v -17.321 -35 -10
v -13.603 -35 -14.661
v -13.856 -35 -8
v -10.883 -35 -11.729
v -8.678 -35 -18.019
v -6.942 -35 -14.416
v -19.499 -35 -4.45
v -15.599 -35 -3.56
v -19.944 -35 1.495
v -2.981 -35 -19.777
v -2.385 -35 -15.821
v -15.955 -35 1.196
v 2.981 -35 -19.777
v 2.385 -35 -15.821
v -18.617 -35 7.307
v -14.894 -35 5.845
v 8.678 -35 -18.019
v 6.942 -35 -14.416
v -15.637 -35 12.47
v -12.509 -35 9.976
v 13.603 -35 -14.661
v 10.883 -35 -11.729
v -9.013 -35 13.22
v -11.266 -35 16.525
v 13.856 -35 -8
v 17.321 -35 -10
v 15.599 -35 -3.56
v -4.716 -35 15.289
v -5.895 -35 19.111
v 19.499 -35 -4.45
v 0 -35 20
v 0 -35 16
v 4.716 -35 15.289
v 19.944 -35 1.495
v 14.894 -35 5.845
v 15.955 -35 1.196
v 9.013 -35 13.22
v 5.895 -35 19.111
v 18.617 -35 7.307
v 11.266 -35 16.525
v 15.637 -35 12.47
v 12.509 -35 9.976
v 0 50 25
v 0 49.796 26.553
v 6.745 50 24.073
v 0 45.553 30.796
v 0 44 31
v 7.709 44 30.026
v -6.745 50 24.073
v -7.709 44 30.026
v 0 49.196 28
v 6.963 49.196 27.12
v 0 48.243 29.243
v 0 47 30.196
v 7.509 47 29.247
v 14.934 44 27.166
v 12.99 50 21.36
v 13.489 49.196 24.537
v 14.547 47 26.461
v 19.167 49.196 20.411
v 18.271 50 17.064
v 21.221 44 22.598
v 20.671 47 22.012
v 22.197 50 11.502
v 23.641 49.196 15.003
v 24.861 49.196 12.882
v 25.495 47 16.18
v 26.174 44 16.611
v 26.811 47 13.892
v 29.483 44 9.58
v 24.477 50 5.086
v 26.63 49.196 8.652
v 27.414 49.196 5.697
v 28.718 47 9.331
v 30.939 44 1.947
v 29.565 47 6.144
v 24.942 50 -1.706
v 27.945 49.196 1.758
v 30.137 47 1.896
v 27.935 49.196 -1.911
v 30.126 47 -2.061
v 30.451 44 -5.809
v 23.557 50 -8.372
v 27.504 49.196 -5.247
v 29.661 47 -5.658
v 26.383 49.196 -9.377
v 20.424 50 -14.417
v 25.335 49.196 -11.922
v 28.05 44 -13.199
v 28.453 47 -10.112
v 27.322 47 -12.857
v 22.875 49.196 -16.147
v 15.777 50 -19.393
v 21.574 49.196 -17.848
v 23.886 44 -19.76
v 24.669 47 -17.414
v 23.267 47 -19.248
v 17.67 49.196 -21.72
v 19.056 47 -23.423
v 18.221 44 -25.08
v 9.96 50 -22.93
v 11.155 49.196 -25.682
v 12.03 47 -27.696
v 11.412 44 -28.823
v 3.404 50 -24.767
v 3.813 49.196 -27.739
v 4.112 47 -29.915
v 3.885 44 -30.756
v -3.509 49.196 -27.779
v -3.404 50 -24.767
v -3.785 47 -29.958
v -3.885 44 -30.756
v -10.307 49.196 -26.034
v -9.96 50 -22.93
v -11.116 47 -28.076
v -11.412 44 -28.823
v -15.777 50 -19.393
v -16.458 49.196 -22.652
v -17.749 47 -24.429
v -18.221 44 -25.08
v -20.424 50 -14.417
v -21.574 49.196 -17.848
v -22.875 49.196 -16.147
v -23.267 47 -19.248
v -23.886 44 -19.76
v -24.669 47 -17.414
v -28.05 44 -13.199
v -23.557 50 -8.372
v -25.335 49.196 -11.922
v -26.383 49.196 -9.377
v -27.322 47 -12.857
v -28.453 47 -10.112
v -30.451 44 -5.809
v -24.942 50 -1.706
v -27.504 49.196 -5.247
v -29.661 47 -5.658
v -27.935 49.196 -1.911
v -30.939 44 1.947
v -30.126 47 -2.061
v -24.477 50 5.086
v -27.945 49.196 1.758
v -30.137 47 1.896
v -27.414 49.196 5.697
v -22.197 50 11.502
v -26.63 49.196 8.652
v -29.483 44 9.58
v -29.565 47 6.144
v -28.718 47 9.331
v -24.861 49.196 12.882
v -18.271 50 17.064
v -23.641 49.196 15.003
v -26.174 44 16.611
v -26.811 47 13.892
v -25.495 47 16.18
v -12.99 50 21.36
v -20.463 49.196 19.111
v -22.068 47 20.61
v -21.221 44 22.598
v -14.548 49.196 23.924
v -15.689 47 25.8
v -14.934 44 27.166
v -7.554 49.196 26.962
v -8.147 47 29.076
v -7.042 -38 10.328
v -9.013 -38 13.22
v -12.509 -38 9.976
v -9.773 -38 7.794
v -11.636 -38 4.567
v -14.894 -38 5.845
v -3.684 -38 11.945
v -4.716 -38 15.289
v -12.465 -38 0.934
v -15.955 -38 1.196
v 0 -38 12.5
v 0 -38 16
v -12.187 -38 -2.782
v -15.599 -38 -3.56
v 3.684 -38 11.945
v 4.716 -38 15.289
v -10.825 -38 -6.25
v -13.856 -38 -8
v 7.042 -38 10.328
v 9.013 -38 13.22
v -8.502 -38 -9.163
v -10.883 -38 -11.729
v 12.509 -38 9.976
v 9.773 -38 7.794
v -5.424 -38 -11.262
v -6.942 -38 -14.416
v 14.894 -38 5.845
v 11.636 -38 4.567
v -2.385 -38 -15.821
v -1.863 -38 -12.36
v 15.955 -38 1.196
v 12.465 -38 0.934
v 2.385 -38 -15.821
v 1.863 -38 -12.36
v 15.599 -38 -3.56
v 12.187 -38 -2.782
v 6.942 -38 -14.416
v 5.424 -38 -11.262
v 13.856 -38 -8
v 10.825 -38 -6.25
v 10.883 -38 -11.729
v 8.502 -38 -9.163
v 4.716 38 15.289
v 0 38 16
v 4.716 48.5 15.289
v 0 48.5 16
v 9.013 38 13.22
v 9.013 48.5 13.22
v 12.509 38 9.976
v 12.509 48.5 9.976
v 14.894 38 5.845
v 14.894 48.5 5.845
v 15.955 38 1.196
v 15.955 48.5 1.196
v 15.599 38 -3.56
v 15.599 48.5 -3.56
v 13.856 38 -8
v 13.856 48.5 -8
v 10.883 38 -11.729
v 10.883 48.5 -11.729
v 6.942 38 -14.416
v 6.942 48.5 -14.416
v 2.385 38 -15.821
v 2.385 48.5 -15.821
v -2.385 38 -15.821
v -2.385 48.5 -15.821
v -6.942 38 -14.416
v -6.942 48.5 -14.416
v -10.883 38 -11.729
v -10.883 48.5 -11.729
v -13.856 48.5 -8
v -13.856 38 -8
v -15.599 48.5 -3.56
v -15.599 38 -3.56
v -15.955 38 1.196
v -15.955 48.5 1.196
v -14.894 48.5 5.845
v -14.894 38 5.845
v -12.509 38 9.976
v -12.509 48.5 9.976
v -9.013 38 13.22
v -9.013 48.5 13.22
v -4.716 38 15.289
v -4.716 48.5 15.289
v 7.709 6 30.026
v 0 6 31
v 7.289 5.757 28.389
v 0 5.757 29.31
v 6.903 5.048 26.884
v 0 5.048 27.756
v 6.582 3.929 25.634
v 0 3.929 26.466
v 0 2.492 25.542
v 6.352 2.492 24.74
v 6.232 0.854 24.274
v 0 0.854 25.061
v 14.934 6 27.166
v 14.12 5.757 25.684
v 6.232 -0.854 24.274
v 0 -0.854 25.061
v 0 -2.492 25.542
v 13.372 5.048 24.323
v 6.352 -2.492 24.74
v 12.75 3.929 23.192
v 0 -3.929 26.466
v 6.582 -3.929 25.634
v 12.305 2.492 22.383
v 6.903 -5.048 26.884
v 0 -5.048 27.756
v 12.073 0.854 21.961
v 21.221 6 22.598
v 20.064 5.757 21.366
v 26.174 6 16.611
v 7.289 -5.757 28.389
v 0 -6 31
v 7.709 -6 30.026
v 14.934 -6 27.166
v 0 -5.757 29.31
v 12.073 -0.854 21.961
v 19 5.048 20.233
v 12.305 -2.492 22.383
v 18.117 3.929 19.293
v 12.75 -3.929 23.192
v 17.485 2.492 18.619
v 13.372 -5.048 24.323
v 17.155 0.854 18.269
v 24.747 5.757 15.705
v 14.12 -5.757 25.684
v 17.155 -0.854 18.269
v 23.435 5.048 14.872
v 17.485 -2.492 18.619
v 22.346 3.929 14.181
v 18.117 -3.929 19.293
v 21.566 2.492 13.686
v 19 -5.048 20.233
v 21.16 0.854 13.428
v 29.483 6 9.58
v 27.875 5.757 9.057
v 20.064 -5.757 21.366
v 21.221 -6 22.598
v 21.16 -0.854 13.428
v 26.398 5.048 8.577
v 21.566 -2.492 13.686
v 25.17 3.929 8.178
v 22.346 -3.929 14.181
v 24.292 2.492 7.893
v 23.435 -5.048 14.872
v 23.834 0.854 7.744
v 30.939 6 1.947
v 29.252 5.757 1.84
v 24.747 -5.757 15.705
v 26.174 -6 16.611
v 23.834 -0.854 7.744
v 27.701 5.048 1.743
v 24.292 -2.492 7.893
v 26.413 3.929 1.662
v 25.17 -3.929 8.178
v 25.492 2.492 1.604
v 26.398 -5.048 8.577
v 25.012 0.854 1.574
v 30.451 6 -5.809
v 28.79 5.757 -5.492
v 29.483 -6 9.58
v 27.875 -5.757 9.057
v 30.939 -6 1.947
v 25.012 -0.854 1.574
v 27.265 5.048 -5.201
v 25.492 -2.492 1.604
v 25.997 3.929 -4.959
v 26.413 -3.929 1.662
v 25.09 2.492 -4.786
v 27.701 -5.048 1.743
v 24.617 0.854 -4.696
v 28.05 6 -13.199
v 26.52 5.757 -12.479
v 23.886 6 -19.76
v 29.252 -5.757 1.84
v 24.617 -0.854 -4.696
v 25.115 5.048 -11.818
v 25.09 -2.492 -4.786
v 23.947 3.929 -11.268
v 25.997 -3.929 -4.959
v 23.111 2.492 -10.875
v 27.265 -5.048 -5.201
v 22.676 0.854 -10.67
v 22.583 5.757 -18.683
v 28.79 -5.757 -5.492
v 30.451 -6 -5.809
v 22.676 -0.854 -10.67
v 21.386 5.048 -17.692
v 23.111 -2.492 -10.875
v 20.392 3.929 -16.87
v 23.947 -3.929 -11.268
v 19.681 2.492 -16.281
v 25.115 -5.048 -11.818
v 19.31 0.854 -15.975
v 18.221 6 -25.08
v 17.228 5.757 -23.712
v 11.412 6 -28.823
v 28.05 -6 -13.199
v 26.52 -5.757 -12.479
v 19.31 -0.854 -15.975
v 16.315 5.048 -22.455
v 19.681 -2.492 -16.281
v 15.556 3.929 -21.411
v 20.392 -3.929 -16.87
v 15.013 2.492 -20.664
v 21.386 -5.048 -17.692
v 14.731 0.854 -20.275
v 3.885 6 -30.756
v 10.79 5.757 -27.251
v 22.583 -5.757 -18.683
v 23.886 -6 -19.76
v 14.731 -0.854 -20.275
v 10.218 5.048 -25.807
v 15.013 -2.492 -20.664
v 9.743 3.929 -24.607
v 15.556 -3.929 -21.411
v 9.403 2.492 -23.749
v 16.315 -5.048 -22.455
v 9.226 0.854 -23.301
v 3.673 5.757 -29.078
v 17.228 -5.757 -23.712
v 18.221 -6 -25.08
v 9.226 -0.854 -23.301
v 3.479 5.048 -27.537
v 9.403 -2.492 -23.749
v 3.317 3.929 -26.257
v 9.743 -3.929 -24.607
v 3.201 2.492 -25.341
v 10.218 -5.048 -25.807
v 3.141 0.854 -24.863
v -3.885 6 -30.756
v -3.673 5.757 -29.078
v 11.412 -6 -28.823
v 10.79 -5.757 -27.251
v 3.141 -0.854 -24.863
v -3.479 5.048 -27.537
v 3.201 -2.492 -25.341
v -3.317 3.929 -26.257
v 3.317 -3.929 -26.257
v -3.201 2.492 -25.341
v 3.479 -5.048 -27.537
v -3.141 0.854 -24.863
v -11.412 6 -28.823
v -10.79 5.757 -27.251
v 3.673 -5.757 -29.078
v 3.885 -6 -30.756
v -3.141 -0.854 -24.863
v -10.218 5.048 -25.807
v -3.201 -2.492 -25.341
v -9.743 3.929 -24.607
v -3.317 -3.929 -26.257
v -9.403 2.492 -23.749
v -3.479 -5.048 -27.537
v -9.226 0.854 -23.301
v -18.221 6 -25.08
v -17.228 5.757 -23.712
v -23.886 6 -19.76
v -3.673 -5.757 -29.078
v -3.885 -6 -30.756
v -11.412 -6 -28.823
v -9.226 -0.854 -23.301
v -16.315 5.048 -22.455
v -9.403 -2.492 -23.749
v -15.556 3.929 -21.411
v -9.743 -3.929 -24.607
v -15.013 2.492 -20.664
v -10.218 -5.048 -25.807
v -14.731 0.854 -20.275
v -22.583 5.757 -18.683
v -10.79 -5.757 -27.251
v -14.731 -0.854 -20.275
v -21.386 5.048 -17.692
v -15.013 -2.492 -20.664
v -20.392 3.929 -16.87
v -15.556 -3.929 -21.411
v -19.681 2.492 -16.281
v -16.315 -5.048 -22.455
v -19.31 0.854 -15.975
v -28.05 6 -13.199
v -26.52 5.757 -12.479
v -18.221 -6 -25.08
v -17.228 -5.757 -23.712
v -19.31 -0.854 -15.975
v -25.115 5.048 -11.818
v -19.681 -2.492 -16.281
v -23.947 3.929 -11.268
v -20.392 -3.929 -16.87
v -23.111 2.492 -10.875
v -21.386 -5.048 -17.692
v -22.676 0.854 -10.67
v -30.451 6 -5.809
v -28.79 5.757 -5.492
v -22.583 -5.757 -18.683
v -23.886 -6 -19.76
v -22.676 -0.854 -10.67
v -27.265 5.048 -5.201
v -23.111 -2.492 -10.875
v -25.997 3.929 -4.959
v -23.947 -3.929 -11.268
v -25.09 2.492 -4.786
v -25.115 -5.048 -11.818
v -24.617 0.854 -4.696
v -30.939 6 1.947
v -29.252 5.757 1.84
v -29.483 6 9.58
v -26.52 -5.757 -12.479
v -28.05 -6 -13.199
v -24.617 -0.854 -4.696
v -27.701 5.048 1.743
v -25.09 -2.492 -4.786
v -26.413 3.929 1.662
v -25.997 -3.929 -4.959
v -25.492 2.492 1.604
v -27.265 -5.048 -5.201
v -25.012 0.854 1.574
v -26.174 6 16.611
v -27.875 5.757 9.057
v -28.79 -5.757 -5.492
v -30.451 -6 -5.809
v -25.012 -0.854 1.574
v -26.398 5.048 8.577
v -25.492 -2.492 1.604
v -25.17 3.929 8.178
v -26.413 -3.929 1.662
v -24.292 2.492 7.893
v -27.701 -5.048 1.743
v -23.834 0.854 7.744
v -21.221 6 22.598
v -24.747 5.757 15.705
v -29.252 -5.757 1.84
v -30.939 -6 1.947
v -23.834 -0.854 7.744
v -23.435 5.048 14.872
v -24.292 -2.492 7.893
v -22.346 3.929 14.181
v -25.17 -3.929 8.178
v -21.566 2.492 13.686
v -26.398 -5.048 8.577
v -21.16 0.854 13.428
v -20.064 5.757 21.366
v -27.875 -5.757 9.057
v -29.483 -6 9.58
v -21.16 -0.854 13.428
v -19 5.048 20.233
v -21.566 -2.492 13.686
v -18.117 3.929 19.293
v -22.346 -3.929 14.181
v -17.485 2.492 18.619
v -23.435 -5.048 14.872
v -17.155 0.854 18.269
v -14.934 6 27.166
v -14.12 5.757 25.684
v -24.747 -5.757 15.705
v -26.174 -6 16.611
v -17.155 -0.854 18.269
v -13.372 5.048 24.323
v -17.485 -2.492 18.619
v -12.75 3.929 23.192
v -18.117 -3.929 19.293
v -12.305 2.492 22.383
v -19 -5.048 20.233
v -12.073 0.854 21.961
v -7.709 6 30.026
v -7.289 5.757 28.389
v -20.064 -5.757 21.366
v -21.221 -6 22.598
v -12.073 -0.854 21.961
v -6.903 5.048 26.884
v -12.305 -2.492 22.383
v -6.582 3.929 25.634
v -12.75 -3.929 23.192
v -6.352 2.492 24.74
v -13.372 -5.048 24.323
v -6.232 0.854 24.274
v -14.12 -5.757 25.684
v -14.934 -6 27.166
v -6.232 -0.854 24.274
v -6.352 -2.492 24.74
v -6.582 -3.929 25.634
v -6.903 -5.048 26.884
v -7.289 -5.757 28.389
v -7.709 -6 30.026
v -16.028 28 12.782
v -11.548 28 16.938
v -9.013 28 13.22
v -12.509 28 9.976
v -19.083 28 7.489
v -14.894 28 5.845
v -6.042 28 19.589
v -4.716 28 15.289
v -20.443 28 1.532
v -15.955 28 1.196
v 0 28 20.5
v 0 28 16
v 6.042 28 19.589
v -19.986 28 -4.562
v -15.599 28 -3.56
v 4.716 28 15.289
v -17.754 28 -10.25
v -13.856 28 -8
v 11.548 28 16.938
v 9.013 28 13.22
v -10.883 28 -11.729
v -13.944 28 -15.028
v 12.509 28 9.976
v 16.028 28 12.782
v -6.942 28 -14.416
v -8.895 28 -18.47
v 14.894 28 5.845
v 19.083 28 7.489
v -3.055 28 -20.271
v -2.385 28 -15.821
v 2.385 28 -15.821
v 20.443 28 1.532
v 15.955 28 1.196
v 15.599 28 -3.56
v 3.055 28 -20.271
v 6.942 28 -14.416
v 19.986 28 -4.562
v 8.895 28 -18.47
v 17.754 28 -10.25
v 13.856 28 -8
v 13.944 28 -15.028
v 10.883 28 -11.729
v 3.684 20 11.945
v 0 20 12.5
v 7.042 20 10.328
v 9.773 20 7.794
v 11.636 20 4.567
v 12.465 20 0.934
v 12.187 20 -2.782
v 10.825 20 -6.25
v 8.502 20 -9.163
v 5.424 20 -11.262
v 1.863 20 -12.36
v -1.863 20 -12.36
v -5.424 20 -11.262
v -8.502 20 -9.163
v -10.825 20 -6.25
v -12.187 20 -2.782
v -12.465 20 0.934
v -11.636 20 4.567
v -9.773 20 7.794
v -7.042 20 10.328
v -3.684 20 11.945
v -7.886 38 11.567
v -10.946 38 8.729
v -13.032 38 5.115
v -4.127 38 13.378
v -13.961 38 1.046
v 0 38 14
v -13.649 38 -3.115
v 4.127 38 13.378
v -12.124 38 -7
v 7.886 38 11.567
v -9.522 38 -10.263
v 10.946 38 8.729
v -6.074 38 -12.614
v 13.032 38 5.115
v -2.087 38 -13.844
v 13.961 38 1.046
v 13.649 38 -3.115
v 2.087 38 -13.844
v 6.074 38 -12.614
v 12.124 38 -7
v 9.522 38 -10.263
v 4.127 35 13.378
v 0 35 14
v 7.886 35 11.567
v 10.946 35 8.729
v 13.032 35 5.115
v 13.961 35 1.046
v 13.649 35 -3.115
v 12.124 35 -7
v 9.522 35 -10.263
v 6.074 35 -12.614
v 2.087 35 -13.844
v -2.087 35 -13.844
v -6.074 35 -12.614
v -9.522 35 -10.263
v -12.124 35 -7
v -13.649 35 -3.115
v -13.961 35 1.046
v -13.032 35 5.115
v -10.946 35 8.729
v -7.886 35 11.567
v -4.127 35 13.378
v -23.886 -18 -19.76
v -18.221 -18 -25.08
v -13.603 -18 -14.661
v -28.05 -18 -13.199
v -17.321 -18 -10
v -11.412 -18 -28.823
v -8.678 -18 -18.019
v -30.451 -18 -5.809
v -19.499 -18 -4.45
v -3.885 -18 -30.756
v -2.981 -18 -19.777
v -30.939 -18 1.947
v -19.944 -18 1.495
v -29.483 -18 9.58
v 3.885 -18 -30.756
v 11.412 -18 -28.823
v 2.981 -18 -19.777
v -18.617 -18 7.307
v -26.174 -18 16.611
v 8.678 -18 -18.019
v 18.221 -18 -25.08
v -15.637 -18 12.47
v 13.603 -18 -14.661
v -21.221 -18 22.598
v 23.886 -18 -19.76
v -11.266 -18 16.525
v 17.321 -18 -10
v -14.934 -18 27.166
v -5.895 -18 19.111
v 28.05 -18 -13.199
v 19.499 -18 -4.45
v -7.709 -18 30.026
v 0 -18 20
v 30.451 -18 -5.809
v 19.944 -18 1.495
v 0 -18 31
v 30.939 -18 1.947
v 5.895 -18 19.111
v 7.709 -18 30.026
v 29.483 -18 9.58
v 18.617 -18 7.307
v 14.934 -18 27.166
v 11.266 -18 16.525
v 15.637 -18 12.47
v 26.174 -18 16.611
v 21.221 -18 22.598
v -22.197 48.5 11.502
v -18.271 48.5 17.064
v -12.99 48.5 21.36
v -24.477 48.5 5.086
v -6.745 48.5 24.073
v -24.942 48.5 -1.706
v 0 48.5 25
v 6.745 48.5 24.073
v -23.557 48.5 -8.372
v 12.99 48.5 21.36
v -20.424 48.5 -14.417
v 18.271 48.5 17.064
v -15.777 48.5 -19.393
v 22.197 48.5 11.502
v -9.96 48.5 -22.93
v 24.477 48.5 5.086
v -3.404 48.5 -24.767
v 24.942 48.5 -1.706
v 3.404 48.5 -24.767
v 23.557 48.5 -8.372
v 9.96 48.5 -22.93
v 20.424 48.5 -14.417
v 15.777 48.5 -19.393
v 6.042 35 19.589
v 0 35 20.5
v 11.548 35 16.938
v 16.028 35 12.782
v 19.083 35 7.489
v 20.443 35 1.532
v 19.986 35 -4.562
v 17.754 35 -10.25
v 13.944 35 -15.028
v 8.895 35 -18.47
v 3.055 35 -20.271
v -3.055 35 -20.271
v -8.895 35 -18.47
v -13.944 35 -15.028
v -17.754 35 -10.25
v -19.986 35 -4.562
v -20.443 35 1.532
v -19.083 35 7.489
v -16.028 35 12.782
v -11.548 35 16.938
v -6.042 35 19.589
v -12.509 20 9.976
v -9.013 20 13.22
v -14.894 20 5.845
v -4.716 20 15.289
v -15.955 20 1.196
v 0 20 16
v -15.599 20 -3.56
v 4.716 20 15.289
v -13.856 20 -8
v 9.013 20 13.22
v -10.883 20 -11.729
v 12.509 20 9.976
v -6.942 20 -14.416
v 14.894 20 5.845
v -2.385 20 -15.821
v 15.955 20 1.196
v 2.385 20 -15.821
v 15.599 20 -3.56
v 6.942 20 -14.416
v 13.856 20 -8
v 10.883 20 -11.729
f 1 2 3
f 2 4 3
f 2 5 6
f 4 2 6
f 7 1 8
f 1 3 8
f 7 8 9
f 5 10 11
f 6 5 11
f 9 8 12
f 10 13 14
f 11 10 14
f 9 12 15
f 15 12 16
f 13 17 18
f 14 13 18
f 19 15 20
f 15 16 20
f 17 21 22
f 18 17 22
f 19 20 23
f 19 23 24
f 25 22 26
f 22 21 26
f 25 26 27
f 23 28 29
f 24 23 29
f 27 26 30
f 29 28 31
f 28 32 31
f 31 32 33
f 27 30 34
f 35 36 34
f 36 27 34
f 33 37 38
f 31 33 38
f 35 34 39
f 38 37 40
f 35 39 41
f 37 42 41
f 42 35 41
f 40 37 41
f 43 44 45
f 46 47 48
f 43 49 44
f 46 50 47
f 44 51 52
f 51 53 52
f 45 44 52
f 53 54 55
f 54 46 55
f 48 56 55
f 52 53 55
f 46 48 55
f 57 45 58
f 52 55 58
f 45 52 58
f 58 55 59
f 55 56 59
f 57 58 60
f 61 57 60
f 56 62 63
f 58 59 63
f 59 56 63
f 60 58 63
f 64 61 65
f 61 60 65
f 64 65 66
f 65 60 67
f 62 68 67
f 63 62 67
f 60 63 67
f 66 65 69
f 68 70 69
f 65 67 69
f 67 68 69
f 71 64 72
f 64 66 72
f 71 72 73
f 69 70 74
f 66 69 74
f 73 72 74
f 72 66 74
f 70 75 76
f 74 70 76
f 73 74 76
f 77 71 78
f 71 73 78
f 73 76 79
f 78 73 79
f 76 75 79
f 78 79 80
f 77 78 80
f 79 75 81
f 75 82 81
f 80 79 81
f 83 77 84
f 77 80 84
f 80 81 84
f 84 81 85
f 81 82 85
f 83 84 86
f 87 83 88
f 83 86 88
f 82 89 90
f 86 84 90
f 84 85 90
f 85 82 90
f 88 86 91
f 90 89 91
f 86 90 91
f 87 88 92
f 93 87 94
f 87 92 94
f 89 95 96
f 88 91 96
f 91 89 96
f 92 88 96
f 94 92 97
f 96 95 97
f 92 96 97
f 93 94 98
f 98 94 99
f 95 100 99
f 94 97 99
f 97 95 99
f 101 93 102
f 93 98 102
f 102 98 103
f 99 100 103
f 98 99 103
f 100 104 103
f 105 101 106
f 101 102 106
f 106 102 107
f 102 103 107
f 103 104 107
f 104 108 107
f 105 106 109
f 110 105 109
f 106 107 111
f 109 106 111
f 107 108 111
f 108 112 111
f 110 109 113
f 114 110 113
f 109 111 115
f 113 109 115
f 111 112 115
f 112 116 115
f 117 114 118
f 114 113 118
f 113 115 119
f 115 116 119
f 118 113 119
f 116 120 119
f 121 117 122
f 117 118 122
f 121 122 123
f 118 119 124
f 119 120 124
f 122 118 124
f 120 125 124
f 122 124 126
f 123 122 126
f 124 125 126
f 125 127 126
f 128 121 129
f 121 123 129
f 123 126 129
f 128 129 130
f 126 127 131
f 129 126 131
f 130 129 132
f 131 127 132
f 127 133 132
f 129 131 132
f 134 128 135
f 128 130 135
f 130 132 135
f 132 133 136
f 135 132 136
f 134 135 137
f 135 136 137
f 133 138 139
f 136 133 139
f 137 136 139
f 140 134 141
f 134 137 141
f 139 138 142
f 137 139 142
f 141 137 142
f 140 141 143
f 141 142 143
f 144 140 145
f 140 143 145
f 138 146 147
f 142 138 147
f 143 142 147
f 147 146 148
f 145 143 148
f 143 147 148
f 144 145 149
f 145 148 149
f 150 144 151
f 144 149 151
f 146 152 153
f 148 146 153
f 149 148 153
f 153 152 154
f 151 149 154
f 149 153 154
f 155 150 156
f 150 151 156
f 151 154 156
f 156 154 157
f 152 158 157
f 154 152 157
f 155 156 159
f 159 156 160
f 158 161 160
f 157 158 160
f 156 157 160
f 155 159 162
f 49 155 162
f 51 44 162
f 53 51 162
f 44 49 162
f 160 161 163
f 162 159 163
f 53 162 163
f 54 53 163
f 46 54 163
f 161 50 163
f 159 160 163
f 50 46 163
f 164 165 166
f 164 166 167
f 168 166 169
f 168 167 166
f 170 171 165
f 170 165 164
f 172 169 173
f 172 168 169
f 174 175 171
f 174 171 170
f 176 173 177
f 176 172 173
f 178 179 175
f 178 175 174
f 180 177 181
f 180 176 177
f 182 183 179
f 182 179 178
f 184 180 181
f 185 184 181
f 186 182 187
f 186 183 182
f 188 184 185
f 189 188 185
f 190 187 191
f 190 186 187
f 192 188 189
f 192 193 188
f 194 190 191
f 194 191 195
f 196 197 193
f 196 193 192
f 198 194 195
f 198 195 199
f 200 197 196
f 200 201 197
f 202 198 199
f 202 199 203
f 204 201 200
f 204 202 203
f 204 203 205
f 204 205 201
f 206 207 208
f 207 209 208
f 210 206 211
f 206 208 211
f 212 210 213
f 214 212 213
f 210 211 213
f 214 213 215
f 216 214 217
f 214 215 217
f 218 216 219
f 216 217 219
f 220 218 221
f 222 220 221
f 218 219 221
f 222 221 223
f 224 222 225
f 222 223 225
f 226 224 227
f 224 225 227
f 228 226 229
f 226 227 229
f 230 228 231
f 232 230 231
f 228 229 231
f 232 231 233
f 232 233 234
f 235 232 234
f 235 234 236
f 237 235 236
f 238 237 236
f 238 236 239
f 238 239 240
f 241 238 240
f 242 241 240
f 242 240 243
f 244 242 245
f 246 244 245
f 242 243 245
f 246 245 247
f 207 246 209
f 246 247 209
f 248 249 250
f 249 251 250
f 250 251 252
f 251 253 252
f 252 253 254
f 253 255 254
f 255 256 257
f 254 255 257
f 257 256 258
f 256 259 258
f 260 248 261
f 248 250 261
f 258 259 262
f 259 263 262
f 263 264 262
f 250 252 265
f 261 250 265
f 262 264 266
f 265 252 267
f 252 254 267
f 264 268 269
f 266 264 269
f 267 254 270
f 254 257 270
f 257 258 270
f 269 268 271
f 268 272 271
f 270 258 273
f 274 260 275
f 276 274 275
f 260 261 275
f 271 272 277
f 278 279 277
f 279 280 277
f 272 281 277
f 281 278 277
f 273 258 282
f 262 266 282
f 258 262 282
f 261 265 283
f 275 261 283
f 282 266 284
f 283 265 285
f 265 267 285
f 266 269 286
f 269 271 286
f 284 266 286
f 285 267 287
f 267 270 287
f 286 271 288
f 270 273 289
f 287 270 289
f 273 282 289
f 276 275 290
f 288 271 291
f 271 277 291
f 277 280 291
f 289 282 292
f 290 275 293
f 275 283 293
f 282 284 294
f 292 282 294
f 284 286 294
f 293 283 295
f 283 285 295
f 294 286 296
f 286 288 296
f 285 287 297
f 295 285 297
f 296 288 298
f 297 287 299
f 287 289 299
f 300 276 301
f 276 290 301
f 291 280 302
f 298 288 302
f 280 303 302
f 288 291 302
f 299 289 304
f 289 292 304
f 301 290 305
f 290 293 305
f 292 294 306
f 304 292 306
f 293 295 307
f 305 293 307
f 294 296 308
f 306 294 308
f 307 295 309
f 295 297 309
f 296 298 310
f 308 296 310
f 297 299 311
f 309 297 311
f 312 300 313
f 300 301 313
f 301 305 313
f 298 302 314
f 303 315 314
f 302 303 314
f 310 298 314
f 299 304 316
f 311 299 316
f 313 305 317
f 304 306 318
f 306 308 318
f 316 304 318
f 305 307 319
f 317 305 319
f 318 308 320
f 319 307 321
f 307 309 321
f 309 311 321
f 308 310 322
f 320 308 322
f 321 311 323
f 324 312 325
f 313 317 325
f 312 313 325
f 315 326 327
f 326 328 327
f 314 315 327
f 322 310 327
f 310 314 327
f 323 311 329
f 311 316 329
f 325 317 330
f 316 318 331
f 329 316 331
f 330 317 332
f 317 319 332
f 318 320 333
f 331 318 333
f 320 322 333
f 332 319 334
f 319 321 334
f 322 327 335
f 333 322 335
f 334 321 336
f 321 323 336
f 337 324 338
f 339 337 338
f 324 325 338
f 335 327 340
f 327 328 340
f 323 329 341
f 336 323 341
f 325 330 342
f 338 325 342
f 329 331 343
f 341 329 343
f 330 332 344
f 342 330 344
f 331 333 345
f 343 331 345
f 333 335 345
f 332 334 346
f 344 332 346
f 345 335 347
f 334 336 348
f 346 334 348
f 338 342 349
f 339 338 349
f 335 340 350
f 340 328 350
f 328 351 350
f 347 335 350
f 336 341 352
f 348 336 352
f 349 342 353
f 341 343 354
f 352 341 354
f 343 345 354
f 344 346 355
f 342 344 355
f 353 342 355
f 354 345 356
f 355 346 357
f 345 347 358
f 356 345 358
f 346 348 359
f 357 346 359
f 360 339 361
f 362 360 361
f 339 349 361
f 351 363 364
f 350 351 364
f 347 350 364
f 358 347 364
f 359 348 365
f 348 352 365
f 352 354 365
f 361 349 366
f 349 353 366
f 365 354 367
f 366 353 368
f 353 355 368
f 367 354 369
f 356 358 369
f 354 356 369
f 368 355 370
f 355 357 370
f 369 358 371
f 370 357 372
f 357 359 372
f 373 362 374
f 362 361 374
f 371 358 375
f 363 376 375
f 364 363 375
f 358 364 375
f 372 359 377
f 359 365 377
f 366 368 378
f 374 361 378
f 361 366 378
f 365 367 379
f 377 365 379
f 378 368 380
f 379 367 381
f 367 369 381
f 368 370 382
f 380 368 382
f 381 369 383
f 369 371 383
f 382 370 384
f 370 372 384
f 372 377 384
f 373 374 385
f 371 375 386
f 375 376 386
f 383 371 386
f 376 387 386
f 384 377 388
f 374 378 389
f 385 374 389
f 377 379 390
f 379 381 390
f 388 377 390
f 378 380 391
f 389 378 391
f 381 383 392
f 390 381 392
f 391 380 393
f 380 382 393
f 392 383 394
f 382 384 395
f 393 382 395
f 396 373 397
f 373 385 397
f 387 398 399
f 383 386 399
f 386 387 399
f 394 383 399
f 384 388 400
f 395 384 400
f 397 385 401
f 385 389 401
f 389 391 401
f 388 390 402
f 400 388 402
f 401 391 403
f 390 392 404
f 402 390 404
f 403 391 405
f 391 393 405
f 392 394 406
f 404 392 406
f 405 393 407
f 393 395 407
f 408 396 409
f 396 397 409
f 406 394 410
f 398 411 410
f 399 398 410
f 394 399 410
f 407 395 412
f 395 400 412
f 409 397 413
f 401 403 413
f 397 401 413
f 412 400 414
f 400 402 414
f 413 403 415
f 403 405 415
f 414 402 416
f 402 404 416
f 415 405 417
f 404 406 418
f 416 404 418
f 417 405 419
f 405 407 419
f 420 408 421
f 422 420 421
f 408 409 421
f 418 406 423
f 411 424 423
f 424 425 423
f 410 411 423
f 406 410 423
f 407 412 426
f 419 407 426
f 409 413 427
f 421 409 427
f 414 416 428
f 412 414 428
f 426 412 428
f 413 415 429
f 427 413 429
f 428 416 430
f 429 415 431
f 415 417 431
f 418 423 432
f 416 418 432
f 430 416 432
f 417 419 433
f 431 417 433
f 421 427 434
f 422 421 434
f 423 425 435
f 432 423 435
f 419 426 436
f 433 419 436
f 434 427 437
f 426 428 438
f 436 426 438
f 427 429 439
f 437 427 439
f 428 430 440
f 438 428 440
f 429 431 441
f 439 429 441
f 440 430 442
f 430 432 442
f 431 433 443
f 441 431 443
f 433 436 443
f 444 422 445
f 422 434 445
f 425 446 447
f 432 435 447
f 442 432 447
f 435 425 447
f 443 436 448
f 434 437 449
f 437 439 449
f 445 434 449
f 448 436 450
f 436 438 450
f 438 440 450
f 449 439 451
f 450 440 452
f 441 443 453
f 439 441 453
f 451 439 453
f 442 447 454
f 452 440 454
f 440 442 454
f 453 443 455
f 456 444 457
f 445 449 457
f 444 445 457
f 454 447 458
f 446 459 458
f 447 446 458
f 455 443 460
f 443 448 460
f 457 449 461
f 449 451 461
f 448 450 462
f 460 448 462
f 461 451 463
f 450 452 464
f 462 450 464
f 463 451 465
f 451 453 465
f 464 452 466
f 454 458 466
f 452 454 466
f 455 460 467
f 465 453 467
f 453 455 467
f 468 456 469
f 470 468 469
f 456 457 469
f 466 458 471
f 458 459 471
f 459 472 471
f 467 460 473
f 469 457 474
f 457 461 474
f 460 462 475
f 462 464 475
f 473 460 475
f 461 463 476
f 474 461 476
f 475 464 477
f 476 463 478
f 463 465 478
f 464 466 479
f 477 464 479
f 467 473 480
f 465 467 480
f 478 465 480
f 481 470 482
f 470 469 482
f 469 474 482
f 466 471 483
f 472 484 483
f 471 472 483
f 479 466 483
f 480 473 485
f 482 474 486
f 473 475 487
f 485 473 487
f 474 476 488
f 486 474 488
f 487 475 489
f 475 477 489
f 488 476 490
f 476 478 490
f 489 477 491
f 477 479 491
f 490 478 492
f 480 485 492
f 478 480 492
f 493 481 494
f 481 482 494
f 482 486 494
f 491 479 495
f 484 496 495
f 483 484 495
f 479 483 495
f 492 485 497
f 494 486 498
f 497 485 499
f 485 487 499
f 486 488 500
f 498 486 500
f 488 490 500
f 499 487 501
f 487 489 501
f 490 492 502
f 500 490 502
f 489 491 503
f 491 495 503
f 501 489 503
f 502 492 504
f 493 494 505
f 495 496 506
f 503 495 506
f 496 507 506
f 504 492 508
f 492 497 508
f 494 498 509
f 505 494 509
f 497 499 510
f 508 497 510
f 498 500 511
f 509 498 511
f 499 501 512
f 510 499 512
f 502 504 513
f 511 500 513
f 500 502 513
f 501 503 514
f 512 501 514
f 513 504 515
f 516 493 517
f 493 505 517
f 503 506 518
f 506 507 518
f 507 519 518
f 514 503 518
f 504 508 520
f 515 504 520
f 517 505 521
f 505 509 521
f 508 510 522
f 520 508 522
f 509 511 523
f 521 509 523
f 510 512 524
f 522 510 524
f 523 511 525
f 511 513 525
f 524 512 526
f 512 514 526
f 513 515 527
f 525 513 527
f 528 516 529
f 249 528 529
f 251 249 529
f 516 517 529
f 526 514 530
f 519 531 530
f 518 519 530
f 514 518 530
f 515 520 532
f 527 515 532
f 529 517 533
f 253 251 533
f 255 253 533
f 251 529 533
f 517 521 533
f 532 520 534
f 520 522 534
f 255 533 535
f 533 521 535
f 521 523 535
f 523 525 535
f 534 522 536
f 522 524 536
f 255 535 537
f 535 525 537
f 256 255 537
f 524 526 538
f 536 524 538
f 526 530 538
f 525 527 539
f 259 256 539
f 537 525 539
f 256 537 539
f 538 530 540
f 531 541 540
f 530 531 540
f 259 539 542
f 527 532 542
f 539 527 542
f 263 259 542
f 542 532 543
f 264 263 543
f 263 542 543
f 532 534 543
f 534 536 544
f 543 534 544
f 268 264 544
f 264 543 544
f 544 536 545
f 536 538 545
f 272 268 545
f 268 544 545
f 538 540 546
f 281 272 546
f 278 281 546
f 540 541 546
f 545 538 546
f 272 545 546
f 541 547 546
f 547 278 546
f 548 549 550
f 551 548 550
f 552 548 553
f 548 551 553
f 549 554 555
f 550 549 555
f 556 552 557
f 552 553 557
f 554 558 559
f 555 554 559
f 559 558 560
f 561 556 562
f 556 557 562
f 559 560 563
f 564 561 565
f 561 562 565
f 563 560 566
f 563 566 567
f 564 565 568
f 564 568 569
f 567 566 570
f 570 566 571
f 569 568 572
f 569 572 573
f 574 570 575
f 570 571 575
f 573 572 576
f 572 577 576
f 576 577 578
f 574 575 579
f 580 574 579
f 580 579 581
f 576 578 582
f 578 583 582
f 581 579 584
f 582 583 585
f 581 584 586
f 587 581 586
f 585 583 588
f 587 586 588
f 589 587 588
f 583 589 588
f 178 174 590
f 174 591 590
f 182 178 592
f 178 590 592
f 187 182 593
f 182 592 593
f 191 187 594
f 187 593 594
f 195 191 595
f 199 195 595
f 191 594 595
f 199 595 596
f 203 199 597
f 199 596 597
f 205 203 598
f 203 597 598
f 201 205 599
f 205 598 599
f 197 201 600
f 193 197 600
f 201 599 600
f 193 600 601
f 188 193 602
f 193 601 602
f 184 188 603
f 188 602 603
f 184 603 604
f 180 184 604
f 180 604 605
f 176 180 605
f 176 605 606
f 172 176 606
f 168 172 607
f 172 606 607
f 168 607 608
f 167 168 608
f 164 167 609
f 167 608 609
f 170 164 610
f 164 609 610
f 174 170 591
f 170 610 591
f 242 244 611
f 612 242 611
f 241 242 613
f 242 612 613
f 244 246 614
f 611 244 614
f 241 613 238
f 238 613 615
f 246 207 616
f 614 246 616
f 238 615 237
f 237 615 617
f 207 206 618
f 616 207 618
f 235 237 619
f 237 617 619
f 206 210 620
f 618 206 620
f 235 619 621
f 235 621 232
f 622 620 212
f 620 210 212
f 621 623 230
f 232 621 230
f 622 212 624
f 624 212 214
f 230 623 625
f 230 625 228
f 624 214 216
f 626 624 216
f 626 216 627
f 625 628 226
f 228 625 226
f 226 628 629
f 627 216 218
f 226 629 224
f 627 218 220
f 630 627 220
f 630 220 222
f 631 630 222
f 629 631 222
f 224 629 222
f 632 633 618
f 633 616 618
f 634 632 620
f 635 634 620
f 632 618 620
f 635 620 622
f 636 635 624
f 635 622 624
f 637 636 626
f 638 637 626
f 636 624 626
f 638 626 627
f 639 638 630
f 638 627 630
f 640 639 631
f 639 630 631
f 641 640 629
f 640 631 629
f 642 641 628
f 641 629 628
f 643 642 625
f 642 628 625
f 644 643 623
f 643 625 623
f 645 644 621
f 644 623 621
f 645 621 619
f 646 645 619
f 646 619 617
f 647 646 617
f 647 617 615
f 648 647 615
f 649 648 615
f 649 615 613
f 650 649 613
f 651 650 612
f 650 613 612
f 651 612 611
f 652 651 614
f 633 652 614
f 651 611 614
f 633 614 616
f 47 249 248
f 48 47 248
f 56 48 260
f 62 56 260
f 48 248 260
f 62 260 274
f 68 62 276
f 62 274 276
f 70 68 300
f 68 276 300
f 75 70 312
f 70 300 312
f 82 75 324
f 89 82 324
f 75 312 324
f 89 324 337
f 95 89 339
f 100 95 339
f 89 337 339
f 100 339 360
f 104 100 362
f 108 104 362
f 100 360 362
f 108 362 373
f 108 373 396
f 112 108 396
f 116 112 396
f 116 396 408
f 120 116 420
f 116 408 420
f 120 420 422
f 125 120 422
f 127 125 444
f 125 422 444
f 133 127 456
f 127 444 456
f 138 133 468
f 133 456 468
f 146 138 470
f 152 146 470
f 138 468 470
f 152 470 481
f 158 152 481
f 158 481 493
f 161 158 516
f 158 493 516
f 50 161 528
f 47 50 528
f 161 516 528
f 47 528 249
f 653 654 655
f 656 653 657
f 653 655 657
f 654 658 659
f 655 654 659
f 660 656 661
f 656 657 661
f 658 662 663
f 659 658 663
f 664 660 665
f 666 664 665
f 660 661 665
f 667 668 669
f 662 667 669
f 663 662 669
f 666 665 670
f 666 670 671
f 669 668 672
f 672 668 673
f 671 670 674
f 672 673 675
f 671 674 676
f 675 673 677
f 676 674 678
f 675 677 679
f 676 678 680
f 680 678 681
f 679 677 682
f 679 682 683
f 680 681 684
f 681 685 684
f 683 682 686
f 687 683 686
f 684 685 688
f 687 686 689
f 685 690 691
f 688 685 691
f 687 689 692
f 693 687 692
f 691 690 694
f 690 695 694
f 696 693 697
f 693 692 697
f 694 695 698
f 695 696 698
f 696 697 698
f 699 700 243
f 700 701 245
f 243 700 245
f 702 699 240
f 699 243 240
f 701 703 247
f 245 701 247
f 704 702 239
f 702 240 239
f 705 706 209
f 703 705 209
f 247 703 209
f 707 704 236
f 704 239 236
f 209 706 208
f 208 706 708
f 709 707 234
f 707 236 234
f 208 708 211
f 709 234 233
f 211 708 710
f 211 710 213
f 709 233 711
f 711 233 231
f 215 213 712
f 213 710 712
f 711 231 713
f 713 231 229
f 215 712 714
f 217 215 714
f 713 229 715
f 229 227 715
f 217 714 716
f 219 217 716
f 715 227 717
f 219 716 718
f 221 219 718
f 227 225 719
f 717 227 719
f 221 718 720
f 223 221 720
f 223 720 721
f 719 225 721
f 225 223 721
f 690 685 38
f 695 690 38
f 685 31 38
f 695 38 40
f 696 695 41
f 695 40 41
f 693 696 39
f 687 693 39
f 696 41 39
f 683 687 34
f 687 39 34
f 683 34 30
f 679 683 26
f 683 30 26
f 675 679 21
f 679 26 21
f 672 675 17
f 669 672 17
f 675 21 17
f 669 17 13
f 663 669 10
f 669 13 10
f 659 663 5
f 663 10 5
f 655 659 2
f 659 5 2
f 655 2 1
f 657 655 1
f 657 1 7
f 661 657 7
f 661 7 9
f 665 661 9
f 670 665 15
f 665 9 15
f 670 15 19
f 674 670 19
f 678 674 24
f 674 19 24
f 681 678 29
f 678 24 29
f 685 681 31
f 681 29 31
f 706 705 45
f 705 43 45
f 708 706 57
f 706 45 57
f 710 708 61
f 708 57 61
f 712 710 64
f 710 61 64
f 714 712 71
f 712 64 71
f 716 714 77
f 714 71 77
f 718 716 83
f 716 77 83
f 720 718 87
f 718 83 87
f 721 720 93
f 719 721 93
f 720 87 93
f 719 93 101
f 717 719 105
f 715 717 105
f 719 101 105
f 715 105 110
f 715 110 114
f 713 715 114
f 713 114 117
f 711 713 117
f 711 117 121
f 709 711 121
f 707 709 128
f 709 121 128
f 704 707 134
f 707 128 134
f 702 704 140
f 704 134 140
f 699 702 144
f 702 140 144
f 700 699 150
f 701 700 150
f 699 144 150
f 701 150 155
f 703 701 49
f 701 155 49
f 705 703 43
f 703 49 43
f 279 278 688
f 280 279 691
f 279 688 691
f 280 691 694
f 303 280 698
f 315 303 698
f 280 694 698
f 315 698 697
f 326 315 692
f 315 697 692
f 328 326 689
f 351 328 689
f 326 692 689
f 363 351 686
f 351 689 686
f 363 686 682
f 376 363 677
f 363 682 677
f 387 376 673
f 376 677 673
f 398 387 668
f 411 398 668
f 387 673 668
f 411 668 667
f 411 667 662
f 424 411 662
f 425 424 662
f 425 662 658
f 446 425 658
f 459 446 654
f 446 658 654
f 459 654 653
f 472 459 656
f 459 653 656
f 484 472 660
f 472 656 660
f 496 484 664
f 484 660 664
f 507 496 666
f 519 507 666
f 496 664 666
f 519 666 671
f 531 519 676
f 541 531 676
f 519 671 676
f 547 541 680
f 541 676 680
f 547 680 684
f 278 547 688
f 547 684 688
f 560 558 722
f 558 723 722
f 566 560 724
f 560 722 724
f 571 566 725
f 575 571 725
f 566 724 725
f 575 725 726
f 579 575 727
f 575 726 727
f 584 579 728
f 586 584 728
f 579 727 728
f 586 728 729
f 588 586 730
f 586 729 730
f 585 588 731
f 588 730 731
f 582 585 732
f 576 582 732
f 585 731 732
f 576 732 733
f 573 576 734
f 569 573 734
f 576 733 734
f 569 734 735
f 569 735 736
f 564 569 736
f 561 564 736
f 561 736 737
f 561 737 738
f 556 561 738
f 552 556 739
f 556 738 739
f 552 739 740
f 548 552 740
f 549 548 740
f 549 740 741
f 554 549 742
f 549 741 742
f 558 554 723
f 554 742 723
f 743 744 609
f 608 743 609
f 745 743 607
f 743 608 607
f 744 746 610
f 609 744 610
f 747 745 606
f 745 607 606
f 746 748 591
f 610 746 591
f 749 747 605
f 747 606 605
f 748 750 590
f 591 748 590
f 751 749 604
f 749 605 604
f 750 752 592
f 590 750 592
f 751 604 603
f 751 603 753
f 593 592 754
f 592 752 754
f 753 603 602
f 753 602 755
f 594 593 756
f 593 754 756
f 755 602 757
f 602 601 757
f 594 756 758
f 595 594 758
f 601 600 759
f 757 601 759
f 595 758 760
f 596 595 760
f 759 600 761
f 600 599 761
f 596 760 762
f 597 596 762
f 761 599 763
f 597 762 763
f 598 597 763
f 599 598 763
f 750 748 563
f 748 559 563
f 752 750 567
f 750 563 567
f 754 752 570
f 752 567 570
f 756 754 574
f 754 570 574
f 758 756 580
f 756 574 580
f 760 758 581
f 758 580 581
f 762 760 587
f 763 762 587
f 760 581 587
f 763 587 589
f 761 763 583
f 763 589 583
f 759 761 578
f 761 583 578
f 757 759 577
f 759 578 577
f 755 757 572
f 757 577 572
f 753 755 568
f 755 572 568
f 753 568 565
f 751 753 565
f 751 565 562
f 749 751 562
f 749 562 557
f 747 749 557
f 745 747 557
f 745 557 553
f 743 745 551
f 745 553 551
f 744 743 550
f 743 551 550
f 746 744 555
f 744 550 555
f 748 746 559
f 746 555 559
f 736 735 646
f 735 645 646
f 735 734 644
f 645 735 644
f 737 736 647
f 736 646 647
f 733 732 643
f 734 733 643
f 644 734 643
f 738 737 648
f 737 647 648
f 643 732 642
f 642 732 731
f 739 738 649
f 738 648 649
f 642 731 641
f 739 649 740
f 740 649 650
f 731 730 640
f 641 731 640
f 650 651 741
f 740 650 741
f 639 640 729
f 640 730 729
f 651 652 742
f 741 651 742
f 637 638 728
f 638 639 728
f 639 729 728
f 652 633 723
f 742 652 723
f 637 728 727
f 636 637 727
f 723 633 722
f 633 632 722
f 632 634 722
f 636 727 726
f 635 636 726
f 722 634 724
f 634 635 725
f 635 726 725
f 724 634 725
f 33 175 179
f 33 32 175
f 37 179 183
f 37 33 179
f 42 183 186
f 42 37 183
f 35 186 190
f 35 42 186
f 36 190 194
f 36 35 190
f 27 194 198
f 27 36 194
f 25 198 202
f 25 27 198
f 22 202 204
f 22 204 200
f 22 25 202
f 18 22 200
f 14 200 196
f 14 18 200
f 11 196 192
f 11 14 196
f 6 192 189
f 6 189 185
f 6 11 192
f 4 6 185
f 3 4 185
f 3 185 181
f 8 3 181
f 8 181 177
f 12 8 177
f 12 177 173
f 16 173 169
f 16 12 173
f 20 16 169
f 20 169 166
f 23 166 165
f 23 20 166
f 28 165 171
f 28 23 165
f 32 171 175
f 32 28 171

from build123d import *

# Parameters (mm, degrees)
F0_W = 3
F0_H = 3.5
F2_R = 5.99999


# Not quite as in the source:
# - a fillet or chamfer is up to 0.001 mm smaller than in the source, because OpenCascade refuses the exact size


with BuildPart() as f1:
    # F0 (on Right) → F1 (revolve)
    with BuildSketch(Plane.YZ):
        with Locations((-36.5, 14.25)):
            Rectangle(F0_W, F0_H)
        Polygon((-18, 12.5), (-18, 20), (-35, 20), (-35, 16), (-35, 12.5), align=None)
        Polygon((-6, 12.5), (-6, 31), (-18, 31), (-18, 20), (-18, 12.5), align=None)
        with BuildLine():
            Line((6, 12.5), (6, 31))
            ThreePointArc((6, 31), (0, 25), (-6, 31))
            Line((-6, 31), (-6, 12.5))
            Line((-6, 12.5), (6, 12.5))
        make_face()
        Polygon((50, 31), (6, 31), (6, 12.5), (20, 12.5), (20, 16), (28, 16), (28, 20.5), (35, 20.5), (35, 14), (38, 14), (38, 16), (48.5, 16), (48.5, 25), (50, 25), align=None)
    revolve(axis=Axis((0, 8.8457800448, 0), (0, 1, 0)))

    # F2 (radius 6 in the source; OpenCascade refuses exactly that, so slightly less here)
    f2_edges = [f1.edges().sort_by_distance(p)[0] for p in [
        (0, 50, -31),
    ]]
    fillet(f2_edges, radius=F2_R)


solid = f1.part
